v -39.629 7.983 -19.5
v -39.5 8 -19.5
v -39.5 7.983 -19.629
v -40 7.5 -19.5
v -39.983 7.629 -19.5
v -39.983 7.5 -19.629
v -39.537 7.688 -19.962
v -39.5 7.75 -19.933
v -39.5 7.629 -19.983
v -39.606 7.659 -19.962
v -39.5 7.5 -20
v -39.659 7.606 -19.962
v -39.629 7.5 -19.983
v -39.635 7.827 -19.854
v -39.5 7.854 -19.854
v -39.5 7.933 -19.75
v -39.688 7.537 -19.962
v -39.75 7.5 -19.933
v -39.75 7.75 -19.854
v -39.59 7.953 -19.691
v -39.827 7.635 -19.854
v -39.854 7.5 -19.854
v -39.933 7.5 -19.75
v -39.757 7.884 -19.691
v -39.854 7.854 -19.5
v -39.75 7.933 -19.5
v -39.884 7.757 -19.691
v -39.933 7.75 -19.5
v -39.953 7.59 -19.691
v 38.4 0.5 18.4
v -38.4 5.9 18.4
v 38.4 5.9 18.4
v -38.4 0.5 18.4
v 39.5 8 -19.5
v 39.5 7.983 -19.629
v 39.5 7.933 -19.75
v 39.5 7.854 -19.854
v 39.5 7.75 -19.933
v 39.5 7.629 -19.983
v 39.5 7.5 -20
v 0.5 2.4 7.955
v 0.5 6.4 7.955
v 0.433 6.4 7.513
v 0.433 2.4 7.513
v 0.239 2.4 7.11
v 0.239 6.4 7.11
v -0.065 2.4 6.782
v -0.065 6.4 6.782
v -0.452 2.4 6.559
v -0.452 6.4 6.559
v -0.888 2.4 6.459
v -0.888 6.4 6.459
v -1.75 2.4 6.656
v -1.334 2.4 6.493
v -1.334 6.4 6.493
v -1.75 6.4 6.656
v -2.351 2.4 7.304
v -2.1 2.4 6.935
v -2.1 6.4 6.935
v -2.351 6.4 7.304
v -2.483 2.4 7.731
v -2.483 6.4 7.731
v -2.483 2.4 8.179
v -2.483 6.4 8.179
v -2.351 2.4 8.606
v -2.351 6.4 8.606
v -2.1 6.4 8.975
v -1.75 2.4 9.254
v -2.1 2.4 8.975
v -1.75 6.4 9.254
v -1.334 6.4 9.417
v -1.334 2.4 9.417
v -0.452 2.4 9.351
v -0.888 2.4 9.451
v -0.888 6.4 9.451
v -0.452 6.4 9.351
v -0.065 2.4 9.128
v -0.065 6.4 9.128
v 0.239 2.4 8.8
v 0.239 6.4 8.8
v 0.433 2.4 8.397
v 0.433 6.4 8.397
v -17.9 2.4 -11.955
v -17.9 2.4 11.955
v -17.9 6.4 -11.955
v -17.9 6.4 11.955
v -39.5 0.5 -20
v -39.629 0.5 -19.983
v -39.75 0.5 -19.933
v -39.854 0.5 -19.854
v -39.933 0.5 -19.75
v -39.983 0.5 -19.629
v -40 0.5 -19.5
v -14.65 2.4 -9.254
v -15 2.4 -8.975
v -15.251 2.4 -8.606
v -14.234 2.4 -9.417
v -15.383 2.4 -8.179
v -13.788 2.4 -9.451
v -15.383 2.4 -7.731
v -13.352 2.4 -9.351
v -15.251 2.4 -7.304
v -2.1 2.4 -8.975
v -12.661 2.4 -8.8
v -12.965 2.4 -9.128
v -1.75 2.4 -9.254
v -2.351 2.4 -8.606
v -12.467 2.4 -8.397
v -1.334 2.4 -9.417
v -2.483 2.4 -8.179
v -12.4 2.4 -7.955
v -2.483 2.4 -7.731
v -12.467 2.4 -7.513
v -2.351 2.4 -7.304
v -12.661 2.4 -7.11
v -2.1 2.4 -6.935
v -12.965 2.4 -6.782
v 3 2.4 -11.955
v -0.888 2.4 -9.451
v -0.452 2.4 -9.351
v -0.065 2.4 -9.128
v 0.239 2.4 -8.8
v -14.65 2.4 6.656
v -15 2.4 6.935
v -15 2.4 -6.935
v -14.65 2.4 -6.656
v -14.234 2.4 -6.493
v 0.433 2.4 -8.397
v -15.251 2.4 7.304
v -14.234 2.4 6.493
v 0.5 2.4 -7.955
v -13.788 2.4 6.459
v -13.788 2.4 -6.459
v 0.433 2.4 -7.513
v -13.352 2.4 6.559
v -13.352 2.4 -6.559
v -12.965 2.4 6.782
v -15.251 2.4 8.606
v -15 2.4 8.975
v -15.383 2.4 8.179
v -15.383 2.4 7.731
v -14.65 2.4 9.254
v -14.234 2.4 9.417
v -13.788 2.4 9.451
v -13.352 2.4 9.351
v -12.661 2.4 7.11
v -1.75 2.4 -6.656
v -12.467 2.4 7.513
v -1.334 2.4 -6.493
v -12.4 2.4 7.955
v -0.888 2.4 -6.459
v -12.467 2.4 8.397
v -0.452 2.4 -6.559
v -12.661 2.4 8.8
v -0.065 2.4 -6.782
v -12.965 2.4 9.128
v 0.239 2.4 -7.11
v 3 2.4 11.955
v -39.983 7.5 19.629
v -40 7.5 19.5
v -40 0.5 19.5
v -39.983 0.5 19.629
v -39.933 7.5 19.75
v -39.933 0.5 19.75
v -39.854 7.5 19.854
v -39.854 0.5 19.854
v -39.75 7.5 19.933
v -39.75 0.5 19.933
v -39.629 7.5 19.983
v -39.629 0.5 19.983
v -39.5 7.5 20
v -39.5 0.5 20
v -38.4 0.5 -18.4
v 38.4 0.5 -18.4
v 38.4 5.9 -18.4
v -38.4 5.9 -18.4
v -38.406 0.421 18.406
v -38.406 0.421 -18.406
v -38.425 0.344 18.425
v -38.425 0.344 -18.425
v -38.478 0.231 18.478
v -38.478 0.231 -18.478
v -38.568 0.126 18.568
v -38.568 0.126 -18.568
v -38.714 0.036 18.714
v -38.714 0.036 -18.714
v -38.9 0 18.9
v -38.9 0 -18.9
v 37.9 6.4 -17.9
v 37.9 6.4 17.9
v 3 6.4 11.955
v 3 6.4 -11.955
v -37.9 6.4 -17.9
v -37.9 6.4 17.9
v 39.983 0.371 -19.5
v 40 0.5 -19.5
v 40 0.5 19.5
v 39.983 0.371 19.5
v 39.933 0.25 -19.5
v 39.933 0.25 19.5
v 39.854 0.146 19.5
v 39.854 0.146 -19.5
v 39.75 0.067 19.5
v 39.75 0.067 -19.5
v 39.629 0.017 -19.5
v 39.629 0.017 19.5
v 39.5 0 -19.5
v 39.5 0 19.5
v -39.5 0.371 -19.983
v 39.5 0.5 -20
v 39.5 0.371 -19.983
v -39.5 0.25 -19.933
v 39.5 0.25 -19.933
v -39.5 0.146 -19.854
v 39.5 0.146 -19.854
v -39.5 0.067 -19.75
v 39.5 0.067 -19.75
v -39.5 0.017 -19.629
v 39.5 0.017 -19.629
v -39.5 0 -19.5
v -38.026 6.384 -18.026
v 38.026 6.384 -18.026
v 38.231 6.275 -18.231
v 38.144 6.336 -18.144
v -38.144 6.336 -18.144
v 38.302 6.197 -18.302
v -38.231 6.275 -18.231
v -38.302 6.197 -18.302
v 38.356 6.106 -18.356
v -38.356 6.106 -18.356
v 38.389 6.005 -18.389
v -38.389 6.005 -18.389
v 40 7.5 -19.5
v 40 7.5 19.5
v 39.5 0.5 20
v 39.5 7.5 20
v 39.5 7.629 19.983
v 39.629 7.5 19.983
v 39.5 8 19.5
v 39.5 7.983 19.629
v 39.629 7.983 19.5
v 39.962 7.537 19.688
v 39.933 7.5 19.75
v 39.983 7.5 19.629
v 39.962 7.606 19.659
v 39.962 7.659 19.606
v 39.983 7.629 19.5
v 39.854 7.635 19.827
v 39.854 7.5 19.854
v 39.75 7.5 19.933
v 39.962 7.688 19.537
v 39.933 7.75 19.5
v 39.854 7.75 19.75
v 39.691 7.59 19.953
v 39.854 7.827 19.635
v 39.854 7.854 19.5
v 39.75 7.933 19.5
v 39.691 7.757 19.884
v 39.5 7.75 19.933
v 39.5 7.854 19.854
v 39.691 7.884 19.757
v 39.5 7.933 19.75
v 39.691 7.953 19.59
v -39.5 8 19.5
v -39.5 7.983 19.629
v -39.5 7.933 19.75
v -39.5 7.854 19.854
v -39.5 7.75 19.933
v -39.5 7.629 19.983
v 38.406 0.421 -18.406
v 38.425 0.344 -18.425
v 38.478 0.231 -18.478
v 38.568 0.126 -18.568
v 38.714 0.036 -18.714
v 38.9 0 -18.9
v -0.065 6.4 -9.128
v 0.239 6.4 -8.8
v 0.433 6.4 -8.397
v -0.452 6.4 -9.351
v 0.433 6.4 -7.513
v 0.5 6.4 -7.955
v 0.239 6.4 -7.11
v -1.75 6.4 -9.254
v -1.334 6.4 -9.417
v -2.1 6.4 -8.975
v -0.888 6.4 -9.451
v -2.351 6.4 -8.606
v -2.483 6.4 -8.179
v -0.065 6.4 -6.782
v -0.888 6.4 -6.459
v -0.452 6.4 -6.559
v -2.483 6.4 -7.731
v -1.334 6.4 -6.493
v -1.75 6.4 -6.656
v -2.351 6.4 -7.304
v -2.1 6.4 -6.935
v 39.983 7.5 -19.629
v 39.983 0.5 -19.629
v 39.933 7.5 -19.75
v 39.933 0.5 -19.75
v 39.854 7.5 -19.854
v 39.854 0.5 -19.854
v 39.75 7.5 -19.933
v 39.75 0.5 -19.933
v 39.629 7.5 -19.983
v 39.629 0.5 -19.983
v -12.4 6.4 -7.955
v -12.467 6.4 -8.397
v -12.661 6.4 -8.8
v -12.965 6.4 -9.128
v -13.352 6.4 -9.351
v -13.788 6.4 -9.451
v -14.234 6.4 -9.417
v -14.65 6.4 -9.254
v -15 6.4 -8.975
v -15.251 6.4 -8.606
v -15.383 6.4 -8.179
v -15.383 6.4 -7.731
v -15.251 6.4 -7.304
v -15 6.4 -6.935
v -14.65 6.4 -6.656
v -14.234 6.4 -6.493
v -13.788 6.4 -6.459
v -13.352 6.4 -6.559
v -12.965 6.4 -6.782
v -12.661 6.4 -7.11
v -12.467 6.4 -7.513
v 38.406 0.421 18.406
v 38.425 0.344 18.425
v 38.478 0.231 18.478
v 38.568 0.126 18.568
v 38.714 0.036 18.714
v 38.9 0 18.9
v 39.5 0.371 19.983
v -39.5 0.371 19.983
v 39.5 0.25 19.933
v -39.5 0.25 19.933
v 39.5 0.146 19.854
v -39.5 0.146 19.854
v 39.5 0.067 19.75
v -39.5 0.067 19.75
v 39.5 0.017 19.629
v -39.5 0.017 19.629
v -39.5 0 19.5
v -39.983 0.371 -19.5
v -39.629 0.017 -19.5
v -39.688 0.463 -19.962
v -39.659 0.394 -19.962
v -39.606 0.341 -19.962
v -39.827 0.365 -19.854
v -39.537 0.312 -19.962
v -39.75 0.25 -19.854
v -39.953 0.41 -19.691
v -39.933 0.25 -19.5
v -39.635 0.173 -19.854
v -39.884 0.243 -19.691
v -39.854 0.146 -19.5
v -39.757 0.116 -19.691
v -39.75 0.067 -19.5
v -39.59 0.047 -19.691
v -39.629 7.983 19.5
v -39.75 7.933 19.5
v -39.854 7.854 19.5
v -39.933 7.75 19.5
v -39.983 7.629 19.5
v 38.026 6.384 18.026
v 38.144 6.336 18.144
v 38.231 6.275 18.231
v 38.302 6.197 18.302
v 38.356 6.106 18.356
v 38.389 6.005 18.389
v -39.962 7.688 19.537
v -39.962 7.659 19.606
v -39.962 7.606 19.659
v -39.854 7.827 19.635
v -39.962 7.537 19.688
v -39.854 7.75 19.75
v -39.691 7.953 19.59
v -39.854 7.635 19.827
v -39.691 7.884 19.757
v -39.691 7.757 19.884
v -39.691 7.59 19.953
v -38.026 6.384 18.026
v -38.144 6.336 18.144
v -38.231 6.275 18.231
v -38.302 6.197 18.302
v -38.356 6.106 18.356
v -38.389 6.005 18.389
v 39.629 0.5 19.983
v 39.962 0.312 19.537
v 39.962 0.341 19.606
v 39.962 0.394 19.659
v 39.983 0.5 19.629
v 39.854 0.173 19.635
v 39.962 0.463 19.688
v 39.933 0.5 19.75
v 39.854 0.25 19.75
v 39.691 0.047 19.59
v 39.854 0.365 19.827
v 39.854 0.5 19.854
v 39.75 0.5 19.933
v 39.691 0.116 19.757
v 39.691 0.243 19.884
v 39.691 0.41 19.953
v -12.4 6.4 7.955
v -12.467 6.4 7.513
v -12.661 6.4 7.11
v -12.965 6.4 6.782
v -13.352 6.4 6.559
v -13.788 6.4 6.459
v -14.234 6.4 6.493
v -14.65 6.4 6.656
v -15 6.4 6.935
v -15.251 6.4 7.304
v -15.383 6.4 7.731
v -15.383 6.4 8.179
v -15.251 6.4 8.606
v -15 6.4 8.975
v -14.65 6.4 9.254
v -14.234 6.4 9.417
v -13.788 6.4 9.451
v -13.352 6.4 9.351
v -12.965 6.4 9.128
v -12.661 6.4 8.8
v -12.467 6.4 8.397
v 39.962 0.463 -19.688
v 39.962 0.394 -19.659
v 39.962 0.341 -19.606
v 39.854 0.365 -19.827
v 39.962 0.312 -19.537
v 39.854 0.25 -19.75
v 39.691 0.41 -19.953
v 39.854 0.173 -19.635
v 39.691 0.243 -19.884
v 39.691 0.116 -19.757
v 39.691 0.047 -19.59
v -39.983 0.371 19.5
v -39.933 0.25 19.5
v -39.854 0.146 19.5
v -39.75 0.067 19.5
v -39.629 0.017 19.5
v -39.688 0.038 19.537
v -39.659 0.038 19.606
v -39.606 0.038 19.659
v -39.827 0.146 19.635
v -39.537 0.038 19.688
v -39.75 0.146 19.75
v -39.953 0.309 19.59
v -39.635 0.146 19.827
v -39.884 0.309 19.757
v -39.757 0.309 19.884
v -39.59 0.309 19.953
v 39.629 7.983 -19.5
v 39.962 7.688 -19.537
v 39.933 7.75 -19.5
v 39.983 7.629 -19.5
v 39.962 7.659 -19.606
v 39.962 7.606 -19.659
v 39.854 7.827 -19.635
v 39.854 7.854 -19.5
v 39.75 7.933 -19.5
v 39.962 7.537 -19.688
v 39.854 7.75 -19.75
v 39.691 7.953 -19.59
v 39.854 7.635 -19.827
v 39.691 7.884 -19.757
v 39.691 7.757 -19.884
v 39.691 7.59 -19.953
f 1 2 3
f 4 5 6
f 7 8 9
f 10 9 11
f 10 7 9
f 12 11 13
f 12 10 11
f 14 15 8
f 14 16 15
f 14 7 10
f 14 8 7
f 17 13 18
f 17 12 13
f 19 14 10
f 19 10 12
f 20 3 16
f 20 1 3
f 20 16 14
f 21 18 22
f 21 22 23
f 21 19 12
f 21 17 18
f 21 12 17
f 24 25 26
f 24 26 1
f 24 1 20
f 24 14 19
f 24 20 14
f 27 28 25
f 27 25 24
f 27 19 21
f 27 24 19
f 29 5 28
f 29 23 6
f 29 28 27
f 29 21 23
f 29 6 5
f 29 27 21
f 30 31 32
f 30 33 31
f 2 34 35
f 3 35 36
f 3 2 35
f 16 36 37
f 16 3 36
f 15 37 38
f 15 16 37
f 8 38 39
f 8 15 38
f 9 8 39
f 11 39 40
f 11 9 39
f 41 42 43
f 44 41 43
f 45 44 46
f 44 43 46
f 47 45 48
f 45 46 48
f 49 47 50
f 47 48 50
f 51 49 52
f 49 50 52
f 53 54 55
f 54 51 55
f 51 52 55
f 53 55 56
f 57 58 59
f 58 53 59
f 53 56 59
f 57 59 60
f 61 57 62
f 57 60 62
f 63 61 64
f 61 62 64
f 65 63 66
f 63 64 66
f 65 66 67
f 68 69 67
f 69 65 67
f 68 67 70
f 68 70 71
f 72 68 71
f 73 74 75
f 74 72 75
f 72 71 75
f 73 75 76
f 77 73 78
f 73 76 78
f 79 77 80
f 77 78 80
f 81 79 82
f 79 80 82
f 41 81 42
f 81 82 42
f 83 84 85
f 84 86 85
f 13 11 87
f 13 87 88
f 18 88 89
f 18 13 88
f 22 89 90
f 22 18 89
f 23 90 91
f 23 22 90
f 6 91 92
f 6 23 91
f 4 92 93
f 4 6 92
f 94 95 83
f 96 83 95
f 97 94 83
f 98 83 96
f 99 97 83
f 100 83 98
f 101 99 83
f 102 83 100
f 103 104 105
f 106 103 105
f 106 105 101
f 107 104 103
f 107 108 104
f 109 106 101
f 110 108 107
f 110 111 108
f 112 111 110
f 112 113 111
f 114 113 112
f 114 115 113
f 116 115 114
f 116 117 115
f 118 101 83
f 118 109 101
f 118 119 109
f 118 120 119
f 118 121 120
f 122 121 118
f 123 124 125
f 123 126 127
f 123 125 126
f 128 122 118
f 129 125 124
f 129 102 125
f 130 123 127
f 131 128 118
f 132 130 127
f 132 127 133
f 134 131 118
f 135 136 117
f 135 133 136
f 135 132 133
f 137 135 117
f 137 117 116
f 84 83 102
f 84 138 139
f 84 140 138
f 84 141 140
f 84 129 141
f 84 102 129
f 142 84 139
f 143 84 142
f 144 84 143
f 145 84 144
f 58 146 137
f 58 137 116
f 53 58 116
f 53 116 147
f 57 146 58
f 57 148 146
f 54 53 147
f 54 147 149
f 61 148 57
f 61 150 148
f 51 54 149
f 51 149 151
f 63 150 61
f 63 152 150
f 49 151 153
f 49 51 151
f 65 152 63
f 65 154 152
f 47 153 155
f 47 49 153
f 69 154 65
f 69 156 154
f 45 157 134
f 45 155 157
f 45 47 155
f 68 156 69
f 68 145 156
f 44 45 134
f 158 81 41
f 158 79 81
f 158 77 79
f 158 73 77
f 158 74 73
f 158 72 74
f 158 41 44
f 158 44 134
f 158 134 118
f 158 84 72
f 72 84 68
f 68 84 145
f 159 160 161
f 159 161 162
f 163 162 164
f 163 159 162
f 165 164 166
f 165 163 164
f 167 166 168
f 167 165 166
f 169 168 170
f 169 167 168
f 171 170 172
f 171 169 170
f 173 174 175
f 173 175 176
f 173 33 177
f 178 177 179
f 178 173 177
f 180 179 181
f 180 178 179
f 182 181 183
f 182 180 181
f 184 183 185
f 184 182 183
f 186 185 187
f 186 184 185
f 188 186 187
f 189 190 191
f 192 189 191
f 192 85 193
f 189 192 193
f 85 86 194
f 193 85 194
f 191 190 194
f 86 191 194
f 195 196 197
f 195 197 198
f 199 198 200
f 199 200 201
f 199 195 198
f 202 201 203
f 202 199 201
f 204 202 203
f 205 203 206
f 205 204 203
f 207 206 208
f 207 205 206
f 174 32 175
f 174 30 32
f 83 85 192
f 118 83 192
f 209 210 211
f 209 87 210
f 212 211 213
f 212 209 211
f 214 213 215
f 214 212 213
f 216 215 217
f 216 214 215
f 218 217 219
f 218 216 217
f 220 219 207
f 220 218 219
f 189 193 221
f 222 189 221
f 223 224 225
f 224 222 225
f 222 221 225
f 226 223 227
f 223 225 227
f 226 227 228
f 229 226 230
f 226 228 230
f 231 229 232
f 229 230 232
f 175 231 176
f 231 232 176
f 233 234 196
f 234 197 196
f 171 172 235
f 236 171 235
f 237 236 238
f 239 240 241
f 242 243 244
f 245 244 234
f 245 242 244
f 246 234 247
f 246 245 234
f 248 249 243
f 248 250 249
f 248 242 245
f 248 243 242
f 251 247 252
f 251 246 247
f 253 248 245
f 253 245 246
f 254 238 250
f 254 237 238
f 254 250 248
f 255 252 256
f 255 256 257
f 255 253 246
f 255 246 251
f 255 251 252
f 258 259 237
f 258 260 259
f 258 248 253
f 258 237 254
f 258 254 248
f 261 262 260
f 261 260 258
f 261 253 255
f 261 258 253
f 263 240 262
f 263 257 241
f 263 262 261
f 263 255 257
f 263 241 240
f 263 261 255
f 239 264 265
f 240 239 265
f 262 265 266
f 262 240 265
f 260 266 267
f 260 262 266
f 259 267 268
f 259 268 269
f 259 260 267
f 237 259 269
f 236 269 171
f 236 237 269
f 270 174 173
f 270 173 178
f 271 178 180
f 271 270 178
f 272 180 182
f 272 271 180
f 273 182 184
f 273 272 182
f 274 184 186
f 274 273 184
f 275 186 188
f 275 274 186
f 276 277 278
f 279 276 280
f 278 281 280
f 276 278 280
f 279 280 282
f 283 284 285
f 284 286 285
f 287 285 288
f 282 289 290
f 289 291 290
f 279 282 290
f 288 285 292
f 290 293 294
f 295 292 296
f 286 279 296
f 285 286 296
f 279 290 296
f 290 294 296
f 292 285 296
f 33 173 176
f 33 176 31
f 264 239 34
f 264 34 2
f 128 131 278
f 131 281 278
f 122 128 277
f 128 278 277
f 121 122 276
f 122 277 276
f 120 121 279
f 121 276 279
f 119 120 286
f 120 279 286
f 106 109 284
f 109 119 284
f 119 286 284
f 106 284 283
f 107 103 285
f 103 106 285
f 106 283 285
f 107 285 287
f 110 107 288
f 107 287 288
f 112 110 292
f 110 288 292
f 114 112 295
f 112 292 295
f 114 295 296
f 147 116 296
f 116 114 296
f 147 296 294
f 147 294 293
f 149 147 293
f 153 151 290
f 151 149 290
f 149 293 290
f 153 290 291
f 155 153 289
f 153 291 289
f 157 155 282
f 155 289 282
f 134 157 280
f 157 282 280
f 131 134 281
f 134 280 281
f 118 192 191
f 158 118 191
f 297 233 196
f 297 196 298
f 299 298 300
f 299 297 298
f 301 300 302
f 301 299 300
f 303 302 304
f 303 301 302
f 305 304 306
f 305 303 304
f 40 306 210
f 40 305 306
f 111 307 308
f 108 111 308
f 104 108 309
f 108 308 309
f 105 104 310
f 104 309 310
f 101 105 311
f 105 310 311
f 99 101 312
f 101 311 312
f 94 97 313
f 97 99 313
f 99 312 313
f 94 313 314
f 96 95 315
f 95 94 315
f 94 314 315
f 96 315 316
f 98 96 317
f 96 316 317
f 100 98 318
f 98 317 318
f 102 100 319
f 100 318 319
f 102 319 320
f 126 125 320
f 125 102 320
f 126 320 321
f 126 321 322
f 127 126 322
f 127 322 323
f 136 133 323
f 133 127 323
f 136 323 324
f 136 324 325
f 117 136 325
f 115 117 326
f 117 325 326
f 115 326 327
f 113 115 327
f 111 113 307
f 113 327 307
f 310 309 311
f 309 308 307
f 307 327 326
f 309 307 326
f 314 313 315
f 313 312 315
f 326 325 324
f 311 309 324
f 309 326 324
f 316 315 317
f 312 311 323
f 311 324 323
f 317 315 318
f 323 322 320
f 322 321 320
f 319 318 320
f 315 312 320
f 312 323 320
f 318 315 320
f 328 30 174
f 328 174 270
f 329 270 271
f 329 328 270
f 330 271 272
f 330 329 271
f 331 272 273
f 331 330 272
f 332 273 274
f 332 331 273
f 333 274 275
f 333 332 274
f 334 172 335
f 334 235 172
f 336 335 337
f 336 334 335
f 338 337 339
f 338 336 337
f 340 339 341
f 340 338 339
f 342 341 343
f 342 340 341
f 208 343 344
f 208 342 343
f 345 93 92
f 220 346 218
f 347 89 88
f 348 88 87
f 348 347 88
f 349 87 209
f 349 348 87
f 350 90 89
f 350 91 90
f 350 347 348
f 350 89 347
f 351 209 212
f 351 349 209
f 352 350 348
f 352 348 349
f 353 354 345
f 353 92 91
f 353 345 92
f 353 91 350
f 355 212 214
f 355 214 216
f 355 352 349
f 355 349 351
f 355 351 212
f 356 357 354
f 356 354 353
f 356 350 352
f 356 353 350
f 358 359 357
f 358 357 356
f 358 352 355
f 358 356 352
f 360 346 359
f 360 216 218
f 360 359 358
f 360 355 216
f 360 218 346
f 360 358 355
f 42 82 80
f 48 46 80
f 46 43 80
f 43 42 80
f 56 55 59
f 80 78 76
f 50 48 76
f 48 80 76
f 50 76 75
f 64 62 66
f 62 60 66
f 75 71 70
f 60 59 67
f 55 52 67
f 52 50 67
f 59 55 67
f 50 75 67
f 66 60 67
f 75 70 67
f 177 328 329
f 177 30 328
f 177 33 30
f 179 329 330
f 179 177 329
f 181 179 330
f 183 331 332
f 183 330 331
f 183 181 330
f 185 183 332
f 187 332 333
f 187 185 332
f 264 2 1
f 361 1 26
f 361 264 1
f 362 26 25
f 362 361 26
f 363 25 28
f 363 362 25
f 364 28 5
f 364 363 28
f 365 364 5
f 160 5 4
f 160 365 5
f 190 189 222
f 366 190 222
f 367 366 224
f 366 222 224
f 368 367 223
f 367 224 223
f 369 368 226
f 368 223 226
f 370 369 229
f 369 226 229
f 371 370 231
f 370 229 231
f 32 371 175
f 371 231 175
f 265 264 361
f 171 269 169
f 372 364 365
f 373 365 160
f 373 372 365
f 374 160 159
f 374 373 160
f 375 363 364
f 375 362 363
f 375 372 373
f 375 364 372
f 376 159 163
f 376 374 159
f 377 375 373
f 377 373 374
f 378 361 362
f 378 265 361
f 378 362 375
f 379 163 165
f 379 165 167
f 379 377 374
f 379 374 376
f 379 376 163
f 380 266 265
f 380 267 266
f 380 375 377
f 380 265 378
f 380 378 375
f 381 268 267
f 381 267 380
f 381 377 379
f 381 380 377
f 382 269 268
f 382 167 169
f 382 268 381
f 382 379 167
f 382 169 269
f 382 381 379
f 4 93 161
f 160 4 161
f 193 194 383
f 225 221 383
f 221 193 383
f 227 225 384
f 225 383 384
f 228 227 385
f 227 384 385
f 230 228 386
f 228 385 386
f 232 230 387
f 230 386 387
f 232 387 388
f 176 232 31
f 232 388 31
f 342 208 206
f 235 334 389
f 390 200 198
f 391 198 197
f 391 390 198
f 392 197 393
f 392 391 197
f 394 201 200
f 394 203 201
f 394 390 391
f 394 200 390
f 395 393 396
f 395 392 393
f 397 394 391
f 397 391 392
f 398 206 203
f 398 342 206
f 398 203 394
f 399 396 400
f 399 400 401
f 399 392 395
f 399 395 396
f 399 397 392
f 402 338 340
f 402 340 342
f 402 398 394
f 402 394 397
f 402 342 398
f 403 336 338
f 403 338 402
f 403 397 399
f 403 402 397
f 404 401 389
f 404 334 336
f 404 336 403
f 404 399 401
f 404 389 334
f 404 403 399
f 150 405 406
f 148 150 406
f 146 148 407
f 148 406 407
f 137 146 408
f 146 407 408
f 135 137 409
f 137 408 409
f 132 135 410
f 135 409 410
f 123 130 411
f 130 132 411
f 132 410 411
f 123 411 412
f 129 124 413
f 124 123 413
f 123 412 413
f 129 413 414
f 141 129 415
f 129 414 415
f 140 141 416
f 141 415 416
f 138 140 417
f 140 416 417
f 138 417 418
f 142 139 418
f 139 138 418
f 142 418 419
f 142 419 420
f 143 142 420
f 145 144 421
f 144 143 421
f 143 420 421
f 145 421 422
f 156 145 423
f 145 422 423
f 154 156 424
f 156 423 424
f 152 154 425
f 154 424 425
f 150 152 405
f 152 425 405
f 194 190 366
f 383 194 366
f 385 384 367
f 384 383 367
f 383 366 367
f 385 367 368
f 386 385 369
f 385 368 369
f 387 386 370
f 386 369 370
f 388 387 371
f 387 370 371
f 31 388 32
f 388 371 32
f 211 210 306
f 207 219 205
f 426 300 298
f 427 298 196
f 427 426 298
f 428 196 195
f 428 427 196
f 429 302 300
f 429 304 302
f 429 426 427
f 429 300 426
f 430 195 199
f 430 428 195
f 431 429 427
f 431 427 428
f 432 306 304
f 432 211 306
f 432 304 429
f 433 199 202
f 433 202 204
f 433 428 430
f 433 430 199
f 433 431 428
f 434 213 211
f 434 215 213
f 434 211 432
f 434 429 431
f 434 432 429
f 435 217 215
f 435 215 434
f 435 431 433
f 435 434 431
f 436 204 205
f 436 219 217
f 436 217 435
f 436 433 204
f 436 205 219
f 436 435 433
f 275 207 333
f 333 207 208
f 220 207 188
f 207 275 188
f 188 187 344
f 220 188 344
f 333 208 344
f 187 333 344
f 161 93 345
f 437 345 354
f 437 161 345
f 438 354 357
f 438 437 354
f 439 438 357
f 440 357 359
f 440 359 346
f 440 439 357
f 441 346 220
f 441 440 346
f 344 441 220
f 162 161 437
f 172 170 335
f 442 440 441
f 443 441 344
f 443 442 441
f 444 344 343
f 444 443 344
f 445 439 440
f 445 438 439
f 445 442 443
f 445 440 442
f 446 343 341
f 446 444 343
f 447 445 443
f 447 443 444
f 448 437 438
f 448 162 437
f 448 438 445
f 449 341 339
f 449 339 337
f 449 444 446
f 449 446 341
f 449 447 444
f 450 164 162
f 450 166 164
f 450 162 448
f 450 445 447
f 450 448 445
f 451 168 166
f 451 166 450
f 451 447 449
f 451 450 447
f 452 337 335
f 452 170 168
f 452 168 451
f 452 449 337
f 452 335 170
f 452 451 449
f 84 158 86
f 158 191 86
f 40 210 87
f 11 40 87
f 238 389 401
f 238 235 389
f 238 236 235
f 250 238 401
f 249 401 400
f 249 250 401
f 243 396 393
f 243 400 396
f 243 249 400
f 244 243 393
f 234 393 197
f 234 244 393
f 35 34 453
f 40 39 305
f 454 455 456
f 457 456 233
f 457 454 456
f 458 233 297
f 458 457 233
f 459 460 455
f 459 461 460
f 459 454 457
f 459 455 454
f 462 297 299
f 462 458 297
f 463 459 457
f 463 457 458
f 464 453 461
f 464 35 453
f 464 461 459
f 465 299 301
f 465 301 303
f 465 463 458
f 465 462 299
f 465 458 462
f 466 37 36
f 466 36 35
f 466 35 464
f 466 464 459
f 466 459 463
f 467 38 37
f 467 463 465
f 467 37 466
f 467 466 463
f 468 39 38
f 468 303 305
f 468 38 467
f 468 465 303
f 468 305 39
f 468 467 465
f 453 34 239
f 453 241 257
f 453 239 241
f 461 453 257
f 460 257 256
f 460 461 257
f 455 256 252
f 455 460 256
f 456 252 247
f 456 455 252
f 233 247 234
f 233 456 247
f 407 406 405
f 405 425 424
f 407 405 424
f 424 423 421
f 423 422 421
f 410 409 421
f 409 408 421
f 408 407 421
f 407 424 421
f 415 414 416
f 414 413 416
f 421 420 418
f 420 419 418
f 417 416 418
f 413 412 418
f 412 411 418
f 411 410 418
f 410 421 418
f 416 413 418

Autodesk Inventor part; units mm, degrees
ref_plane "YZ Plane" through (0, 0, 0) normal (1, 0, 0) x (0, 1, 0)
ref_plane "XZ Plane" through (0, 0, 0) normal (0, 1, 0) x (-1, 0, 0)
ref_plane "XY Plane" through (0, 0, 0) normal (0, 0, 1) x (1, 0, 0)
sketch "Sketch1" plane through (0, 0, 0) normal (0, 1, 0) x (-1, 0, 0)
  line L0 (40, 20) -> (-40, 20)
  line L1 (-40, 20) -> (-40, -20)
  line L2 (-40, -20) -> (40, -20)
  line L3 (40, -20) -> (40, 20)
  line L4 (40, 20) -> (-40, -20) construction
  line L5 (-40, 20) -> (40, -20) construction
  point P0 (0, 0)
  dimension "d0" = 80
  dimension "d1" = 40
extrude "Extrusion1" add sketch "Sketch1" along normal blind 8
shell "Shell1" thickness 1.6 removed faces 1 at (13.3333, 0, 6.6667)
fillet "Fillet1" radius 0.5 20 edges at (0, 8, 20) (-40, 8, 0) (-40, 4, 20) (-40, 0, 0) (0, 0, 20) (40, 4, 20) (-40, 4, -20) (0, 0, -20) (0, 8, -20) (40, 4, -20) (40, 8, 0) (38.4, 0, 0) (40, 0, 0) (0, 0, 18.4) (0, 0, -18.4) (-38.4, 0, 0) (38.4, 6.4, 0) (0, 6.4, -18.4) (0, 6.4, 18.4) (-38.4, 6.4, 0)
sketch "Sketch4" plane through (-37.9, 6.4, 17.9) normal (0, -1, 0) x (1, 0, 0)
  circle A0 centre (36.9, -25.855) radius 1.5
  circle A1 centre (24, -25.855) radius 1.5
  circle A2 centre (24, -9.945) radius 1.5
  circle A3 centre (36.9, -9.945) radius 1.5
  line L0 (0, -35.8) -> (0, 0) projected
  line L1 (0, -17.9) -> (71.9831, -17.9)
  line L2 (36.9, -9.945) -> (24, -25.855) construction
  line L3 (24, -9.945) -> (36.9, -25.855) construction
  line L4 (40.9, -5.945) -> (20, -5.945)
  line L5 (20, -5.945) -> (20, -29.855)
  line L6 (20, -29.855) -> (40.9, -29.855)
  line L7 (40.9, -29.855) -> (40.9, -5.945)
  line L8 (40.9, -5.945) -> (20, -29.855) construction
  line L9 (20, -5.945) -> (40.9, -29.855) construction
  point P0 (30.45, -17.9)
  dimension "d24" = 3
  dimension "d25" = 3
  dimension "d28" = 15.91
  dimension "d29" = 12.9
  dimension "d30" = 4
  dimension "d31" = 4
  dimension "d32" = 20
extrude "Extrusion4" add sketch "Sketch4" along normal blind 4
equation "\"d0\" = plate_depth"
equation "\"d1\" = plate_width"
equation "\"plate_width\" = 40"
equation "\"plate_depth\" = 80"
properties part number "plate"
